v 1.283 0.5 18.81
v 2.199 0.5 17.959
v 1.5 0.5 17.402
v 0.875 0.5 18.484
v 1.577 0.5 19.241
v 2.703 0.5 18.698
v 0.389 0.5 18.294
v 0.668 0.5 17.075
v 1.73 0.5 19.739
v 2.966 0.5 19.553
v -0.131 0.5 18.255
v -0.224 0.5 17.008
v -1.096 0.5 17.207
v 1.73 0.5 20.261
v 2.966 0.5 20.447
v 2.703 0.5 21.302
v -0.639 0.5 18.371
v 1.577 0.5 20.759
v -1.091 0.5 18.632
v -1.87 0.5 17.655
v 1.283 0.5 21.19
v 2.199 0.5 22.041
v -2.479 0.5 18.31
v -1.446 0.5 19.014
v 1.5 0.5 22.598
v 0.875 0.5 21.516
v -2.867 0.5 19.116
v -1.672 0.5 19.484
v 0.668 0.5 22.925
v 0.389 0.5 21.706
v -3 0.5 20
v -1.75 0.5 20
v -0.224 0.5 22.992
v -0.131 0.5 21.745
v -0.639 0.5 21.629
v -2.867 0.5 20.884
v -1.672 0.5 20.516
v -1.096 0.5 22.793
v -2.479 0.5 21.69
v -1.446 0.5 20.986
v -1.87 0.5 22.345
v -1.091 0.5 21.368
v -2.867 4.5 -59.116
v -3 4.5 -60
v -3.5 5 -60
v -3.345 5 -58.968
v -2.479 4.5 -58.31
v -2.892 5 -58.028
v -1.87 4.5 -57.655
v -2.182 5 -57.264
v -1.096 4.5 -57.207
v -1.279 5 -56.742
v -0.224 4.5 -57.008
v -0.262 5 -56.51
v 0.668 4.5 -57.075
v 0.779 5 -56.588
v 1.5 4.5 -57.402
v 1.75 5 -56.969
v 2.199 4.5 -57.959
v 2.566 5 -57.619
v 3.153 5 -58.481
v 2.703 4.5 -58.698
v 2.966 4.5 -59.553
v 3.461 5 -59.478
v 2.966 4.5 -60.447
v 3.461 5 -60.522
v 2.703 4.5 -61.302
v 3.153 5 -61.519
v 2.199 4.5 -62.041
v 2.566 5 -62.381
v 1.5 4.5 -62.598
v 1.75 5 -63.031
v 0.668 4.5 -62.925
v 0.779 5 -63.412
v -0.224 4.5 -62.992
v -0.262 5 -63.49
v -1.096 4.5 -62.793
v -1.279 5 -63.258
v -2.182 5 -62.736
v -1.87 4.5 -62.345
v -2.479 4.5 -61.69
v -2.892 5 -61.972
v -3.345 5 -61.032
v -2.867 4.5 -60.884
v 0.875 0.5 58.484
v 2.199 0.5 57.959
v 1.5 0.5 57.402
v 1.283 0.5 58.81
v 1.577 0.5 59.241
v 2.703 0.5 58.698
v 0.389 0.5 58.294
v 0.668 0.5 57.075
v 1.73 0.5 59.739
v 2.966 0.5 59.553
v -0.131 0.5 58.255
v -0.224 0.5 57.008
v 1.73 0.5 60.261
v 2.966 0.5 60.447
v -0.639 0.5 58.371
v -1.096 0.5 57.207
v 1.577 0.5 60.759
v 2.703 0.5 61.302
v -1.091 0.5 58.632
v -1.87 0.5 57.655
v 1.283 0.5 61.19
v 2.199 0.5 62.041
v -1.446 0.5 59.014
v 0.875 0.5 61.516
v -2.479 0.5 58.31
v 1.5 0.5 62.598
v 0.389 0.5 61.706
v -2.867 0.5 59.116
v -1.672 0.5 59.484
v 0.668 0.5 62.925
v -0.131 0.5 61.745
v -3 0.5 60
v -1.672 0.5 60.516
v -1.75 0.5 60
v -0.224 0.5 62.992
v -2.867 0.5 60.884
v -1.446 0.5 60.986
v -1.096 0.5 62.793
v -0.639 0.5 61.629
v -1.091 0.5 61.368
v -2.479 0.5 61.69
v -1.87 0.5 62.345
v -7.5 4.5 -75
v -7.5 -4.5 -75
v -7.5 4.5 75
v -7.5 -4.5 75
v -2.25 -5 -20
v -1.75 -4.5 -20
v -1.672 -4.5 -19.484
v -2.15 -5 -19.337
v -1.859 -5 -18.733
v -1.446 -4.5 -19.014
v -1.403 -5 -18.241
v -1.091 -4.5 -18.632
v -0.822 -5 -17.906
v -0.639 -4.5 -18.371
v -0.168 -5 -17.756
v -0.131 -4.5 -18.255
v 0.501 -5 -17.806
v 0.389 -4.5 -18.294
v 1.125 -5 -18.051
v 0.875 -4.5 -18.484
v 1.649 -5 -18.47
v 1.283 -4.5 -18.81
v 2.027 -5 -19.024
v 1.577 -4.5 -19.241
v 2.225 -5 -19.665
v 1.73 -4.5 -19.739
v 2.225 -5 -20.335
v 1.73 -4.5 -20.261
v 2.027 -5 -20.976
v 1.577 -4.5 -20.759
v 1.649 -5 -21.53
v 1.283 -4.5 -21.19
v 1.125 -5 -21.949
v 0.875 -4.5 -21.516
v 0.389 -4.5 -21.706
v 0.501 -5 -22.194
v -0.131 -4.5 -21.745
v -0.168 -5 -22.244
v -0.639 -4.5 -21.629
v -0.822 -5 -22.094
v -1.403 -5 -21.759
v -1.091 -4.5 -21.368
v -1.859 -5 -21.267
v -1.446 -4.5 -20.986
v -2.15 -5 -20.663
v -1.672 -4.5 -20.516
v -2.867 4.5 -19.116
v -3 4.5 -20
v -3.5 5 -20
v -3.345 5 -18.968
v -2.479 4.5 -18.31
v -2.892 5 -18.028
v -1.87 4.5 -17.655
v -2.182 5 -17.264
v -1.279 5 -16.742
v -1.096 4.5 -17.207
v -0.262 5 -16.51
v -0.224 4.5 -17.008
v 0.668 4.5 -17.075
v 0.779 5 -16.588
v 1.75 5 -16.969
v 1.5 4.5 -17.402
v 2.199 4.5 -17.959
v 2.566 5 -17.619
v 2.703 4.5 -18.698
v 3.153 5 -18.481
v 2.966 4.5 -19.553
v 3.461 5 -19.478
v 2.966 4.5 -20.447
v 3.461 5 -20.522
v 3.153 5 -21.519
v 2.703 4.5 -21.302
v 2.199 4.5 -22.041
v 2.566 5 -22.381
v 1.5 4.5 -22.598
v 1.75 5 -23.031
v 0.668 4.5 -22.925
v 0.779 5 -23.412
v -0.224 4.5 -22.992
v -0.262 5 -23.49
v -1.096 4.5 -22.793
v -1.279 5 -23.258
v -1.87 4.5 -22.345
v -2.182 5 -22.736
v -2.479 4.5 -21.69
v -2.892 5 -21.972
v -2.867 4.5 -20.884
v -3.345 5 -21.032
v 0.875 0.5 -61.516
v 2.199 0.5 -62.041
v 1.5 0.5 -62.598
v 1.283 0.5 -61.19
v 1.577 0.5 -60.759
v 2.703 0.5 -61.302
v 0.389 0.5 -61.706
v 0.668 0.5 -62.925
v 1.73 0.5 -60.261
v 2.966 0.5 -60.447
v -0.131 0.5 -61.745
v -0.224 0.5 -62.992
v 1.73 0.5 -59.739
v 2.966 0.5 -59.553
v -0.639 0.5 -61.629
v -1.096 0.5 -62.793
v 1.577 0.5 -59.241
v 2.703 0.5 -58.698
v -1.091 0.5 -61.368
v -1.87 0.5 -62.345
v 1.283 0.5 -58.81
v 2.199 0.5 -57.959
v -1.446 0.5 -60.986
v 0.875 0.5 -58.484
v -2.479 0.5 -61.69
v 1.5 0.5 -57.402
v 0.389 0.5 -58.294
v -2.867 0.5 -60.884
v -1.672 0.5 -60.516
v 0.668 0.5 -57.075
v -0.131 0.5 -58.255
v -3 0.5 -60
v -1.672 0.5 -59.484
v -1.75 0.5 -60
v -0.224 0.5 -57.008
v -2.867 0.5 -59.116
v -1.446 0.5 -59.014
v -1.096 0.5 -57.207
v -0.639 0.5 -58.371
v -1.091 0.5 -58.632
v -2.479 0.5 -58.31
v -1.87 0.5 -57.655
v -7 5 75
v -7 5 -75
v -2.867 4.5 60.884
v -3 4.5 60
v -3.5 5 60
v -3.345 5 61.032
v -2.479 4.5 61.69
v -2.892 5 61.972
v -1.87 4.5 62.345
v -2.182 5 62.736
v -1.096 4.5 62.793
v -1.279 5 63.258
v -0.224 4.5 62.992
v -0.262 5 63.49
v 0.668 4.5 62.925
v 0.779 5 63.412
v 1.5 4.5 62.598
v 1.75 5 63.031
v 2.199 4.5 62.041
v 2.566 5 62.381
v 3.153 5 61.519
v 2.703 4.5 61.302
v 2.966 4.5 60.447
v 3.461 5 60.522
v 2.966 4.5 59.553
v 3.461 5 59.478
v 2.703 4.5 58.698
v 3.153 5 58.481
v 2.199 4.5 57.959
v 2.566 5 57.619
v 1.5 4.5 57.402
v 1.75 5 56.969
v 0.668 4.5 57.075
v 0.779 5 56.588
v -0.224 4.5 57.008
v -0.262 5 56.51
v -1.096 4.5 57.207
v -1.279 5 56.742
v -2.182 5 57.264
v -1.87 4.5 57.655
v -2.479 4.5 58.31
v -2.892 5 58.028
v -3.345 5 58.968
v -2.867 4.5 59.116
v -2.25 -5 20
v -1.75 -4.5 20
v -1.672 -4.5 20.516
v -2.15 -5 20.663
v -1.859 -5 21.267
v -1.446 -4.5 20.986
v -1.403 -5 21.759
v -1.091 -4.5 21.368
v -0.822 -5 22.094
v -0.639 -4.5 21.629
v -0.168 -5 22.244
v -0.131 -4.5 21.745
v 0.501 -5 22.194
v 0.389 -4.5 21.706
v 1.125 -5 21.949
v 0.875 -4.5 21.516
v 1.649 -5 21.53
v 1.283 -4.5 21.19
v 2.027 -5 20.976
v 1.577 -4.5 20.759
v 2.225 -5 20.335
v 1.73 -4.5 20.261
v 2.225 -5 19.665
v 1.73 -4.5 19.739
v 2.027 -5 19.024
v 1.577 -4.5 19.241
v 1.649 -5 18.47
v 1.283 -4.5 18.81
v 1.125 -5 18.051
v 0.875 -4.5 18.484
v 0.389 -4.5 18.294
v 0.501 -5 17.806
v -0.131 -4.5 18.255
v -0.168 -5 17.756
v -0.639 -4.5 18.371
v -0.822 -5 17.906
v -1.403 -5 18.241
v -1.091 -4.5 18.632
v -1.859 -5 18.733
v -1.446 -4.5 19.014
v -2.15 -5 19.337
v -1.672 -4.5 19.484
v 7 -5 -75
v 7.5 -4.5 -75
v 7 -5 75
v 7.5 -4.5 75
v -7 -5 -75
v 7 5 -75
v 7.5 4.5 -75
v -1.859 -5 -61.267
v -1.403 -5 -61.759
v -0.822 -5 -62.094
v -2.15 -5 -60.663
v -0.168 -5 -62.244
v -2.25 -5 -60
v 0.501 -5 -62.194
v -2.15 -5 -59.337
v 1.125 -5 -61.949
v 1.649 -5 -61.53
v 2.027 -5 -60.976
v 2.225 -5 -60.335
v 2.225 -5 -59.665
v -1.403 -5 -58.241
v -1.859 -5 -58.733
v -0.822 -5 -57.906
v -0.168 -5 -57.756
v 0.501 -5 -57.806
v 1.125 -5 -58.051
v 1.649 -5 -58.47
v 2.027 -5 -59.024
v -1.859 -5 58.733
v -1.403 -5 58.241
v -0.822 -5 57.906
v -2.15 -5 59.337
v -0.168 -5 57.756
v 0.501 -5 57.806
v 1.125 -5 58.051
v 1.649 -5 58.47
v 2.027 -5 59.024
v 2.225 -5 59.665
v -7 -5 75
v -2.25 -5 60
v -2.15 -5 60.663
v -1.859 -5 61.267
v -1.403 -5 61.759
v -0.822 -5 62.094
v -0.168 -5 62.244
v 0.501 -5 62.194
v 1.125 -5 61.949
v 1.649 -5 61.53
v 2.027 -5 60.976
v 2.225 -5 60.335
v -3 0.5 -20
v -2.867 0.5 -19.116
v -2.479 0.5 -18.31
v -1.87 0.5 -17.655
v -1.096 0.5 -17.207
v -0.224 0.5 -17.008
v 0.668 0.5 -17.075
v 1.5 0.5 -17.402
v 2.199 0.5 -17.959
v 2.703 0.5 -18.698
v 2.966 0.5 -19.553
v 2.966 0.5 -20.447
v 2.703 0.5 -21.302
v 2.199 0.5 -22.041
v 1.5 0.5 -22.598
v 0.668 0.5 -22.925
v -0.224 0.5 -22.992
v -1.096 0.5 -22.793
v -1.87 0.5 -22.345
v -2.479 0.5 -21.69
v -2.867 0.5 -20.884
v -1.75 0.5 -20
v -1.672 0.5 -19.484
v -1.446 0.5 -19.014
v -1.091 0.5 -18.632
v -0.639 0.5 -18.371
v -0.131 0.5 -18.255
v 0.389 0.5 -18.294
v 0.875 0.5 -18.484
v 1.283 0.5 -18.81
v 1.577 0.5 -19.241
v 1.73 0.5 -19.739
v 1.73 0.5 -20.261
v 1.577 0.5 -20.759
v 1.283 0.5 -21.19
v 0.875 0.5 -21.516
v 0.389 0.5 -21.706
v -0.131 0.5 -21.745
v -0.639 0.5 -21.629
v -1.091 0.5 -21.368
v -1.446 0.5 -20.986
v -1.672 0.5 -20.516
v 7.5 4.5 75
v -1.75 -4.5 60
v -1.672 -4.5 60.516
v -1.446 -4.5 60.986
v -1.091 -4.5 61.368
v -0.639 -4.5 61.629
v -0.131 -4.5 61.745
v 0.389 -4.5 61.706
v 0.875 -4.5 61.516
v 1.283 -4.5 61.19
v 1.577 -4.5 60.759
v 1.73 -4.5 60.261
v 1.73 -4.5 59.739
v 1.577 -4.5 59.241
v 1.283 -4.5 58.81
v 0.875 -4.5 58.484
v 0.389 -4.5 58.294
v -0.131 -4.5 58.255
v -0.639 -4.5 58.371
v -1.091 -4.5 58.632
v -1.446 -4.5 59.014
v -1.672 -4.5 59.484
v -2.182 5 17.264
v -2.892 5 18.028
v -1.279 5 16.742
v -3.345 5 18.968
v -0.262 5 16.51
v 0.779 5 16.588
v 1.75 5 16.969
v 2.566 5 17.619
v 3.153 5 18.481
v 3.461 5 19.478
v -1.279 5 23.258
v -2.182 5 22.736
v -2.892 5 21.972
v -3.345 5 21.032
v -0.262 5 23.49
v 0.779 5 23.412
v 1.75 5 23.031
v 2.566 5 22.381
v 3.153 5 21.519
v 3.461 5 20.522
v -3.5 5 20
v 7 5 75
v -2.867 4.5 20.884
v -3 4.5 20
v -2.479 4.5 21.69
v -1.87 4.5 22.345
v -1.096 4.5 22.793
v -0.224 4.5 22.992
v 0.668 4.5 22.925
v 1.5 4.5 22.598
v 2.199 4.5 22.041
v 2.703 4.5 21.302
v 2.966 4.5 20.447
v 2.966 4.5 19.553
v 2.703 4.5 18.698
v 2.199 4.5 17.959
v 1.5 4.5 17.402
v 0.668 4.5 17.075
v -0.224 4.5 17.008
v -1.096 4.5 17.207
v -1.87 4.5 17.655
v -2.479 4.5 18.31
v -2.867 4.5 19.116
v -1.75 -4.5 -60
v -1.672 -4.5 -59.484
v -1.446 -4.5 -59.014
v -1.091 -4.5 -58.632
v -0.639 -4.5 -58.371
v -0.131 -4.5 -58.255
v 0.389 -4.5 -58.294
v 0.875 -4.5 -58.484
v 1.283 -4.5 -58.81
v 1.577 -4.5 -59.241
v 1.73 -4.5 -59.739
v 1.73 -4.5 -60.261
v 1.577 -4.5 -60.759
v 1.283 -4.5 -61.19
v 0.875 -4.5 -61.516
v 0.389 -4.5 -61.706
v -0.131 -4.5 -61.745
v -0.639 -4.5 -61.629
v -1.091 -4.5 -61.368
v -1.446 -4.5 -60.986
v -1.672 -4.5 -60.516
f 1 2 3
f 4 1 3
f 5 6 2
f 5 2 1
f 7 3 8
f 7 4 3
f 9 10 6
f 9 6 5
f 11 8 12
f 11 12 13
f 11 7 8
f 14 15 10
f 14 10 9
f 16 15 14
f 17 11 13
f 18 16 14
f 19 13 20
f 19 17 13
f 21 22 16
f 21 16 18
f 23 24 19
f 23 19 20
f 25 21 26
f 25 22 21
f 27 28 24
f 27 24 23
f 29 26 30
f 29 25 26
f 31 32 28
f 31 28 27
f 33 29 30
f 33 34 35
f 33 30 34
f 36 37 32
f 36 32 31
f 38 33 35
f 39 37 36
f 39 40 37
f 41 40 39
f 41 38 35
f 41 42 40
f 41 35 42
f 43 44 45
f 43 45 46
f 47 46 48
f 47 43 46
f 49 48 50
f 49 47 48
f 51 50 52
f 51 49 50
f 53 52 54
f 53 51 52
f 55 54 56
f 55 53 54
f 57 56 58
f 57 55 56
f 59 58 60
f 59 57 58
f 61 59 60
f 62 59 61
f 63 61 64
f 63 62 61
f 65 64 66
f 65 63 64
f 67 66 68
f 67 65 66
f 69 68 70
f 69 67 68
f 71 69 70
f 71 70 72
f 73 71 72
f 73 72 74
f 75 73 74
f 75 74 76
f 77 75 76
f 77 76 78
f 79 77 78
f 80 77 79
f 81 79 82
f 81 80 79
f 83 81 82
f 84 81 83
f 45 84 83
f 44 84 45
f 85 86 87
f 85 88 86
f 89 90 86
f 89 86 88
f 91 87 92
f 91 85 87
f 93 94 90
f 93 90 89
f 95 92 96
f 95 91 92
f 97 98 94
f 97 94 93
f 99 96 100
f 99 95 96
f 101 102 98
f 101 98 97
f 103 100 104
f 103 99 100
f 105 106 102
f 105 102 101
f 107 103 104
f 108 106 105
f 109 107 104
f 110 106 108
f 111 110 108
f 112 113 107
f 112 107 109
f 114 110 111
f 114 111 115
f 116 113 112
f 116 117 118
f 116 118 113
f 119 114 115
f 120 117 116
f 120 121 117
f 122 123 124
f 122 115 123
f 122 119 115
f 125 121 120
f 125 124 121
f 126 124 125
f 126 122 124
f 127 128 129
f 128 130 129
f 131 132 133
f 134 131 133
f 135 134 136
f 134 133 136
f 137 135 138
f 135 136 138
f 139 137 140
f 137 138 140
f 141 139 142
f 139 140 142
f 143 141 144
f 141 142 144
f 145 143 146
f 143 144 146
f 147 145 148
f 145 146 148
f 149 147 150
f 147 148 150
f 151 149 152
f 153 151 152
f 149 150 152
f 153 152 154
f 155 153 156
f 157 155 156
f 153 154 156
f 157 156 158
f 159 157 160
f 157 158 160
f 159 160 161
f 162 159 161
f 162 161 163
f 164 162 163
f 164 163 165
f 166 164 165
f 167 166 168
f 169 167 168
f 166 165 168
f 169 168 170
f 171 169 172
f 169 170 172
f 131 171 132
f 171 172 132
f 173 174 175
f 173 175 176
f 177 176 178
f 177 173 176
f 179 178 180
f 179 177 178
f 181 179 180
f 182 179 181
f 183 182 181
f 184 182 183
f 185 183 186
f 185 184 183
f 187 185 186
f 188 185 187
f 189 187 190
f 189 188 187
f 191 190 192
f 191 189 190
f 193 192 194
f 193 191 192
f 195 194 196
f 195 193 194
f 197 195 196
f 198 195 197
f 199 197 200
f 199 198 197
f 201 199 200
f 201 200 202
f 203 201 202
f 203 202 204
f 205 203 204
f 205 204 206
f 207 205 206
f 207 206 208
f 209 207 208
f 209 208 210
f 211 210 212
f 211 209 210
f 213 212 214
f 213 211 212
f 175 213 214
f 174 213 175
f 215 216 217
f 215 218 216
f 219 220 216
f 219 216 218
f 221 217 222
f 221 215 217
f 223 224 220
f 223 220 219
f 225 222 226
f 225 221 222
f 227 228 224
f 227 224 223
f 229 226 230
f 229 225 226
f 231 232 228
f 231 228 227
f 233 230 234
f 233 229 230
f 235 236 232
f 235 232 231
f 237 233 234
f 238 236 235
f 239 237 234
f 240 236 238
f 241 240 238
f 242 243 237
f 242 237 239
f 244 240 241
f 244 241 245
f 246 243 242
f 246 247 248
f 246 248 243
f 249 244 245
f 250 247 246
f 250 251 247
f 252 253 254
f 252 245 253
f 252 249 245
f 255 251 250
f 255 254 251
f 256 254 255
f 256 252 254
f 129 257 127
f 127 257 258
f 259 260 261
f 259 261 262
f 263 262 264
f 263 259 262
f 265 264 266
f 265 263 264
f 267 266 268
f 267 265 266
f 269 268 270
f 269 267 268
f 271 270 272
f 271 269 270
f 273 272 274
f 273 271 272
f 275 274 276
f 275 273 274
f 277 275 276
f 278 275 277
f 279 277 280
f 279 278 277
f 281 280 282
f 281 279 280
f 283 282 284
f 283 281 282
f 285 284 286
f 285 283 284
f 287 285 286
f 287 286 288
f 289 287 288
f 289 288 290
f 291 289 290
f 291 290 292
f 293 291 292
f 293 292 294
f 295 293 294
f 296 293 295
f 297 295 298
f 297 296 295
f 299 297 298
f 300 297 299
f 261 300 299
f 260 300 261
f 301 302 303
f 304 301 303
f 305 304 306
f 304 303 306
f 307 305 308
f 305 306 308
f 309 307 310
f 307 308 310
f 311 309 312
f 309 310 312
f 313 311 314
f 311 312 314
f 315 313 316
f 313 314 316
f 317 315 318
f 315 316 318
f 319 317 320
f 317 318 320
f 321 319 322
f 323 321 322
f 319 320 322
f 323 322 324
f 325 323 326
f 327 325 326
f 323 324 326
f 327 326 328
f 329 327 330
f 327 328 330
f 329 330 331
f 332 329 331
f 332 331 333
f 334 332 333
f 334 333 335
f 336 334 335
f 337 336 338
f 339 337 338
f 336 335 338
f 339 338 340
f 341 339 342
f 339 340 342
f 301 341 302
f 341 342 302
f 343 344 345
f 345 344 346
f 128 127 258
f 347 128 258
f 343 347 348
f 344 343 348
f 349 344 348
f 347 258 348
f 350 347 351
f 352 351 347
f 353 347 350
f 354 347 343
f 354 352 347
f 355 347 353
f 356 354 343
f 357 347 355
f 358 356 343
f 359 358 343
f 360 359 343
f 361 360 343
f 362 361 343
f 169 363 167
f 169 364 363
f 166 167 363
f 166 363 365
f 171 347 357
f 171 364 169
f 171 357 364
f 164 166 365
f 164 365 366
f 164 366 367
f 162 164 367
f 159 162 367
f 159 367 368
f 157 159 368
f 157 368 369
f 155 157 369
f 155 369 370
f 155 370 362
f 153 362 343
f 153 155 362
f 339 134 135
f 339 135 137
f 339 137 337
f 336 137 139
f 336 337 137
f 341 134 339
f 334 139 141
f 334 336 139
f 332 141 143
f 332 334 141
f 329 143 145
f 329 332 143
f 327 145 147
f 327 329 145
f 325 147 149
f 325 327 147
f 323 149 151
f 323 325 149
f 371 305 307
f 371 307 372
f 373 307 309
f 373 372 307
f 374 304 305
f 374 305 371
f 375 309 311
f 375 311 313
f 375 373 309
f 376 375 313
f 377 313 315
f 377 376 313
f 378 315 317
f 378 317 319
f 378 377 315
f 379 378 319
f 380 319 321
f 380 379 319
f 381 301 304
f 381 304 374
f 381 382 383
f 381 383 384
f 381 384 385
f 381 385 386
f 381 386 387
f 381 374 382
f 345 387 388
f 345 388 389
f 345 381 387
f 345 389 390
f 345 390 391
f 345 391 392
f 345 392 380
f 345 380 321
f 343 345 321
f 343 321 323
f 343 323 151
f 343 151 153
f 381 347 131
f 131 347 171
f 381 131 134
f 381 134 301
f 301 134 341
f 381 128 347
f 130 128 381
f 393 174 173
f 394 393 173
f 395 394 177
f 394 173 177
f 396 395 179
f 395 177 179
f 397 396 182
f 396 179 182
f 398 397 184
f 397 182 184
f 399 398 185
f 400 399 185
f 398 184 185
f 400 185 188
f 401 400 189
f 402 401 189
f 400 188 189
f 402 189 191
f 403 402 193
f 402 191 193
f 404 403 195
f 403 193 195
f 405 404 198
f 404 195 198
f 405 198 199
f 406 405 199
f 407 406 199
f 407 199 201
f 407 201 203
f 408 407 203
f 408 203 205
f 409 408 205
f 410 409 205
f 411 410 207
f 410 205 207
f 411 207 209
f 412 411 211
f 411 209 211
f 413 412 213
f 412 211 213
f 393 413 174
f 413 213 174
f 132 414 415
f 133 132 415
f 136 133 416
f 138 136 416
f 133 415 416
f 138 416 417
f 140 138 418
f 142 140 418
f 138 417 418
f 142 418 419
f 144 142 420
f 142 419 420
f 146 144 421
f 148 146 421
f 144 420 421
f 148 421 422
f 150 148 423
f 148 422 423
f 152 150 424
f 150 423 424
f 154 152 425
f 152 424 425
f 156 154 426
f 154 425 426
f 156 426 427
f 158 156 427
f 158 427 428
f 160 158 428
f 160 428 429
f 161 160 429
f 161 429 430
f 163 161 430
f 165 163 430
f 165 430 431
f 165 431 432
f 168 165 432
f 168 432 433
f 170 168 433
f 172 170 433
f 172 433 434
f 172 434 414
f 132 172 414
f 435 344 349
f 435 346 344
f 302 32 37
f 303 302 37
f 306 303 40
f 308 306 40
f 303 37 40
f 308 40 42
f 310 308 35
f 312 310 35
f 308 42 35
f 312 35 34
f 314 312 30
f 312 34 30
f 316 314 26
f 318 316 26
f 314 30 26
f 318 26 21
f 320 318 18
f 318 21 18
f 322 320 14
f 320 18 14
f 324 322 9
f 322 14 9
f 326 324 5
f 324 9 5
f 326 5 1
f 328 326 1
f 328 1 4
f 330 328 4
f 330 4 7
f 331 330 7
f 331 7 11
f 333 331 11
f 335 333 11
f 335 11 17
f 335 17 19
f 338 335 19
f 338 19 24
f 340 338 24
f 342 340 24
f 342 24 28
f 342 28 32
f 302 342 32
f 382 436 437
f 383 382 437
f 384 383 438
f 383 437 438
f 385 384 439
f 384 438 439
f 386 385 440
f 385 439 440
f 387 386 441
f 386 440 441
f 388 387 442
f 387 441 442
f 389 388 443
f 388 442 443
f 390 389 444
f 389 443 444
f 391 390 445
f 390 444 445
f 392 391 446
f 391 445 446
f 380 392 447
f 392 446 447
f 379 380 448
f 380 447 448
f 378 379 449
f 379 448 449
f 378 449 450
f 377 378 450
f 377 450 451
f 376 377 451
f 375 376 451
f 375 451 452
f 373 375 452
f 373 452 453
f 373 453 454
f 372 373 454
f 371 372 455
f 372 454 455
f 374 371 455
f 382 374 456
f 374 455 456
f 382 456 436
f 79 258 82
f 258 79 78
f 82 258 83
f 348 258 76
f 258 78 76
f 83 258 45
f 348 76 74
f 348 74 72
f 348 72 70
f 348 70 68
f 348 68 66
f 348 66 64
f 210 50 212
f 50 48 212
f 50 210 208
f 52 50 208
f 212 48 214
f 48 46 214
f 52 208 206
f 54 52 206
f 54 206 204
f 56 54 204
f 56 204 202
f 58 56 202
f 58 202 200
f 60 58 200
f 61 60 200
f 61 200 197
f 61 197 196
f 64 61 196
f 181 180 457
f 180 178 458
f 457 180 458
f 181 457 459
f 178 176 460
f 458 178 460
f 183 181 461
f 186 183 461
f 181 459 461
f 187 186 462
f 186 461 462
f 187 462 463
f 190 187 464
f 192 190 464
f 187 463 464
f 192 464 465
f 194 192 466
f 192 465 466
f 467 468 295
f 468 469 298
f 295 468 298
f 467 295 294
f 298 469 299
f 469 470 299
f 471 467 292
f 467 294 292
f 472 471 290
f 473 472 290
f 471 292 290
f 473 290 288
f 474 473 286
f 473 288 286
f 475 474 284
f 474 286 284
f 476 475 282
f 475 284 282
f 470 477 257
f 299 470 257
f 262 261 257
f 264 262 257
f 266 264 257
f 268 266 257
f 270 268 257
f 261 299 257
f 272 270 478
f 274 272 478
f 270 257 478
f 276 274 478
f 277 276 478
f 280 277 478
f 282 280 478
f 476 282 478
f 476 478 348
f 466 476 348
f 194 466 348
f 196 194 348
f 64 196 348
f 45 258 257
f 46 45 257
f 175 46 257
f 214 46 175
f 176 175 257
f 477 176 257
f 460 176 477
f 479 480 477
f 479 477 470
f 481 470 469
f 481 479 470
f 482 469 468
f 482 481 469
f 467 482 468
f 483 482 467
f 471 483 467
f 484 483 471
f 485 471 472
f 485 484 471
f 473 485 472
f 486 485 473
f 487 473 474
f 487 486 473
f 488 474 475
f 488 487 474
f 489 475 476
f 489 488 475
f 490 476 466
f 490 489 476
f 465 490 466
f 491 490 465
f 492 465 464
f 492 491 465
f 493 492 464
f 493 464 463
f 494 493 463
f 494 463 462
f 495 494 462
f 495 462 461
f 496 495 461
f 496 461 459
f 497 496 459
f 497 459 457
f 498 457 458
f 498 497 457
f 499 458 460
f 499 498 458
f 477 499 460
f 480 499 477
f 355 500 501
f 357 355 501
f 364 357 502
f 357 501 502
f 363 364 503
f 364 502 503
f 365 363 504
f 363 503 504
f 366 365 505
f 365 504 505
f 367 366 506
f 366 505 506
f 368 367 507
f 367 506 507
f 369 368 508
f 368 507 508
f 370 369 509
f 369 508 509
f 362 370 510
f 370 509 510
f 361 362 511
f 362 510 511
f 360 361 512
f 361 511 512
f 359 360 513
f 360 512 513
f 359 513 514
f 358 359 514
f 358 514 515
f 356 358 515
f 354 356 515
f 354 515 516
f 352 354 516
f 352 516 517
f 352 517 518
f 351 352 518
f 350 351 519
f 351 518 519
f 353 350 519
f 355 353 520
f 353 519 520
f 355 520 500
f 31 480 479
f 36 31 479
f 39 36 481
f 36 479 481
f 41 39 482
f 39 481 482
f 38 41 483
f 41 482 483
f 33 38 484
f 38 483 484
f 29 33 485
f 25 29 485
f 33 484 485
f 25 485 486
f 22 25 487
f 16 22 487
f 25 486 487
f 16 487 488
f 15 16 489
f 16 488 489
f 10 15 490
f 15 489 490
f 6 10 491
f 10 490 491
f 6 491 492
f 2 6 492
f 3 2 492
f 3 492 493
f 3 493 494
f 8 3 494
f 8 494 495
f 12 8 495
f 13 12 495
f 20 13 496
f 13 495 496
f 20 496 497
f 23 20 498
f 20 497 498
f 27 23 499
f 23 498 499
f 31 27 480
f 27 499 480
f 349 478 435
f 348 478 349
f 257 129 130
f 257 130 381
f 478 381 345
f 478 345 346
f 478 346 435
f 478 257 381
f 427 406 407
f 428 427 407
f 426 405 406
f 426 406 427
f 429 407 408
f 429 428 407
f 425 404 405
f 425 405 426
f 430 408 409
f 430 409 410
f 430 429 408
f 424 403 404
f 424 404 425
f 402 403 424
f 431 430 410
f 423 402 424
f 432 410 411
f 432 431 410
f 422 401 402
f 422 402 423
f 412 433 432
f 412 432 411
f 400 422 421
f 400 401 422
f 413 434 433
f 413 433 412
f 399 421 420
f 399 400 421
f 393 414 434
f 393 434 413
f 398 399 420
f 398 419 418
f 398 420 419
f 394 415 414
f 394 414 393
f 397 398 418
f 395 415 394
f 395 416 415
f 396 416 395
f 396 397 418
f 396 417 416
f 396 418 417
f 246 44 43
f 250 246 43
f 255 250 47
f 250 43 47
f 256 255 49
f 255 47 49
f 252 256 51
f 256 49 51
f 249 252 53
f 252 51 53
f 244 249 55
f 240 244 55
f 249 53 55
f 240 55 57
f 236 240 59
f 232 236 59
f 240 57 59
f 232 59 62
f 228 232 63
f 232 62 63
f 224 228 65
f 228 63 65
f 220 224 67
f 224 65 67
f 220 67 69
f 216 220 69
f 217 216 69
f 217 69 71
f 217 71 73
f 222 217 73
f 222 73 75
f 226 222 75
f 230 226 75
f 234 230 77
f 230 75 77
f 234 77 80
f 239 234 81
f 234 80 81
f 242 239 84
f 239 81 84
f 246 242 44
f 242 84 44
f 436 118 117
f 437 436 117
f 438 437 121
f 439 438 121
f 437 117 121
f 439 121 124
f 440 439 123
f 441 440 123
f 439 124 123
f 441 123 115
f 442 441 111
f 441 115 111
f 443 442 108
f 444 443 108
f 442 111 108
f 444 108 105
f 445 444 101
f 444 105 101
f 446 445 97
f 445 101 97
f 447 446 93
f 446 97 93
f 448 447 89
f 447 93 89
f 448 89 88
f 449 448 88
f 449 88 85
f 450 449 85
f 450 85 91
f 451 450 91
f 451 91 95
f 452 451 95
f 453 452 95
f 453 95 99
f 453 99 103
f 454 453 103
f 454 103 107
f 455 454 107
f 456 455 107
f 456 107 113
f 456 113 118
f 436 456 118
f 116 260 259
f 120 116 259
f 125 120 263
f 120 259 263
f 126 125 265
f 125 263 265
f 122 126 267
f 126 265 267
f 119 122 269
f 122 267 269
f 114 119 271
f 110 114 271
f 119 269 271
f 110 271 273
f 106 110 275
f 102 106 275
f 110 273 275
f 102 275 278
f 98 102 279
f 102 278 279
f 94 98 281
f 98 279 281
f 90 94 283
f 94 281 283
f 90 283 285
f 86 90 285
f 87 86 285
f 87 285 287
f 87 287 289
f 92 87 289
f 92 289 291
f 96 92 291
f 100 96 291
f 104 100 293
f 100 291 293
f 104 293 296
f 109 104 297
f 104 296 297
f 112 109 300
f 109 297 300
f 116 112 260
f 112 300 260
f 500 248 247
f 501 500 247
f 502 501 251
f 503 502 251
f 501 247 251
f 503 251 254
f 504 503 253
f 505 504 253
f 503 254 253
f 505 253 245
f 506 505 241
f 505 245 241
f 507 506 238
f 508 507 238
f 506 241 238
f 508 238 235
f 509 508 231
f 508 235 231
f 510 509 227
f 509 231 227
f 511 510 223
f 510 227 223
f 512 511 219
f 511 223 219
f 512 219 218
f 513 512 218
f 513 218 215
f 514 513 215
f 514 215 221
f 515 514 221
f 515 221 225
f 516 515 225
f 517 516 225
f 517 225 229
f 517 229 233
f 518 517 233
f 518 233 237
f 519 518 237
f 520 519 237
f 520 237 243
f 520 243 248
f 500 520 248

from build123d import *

# Parameters (mm, degrees)
SKETCH1_W                  = 15
SKETCH1_H                  = 10
BOSS_EXTRUDE1_DEPTH        = 75
SKETCH2_R                  = 3
CUT_EXTRUDE1_DEPTH         = 4.5
SKETCH3_R                  = 1.75
CUT_EXTRUDE2_DEPTH         = 76.574466588
CHAMFER1_SIZE              = 0.5
LPATTERN1_COUNT            = 4
LPATTERN1_PITCH            = 40
CHAMFER1_OF_LPATTERN1_SIZE = 0.5
CHAMFER2_SIZE              = 0.5


with BuildPart() as part:
    # Sketch1 → Boss-Extrude1 (new, symmetric)
    with BuildSketch(Plane.XY):
        Rectangle(SKETCH1_W, SKETCH1_H)
    extrude(amount=BOSS_EXTRUDE1_DEPTH, both=True)

    # Sketch2 → Cut-Extrude1 (cut)
    with BuildSketch(Plane(origin=(0, 5, 0), x_dir=(1, 0, 0), z_dir=(0, 1, 0))):
        with Locations(Location((0, -60, 0), (0, 0, 180))):
            Circle(SKETCH2_R)
    cut_extrude1 = extrude(amount=-CUT_EXTRUDE1_DEPTH, mode=Mode.SUBTRACT)

    # Sketch3 → Cut-Extrude2 (cut, through all)
    with BuildSketch(Plane(origin=(0, 0.5, 0), x_dir=(1, 0, 0), z_dir=(0, 1, 0))):
        with Locations(Location((0, -60, 0), (0, 0, 180))):
            Circle(SKETCH3_R)
    cut_extrude2 = extrude(amount=-CUT_EXTRUDE2_DEPTH, mode=Mode.SUBTRACT)

    # Chamfer1
    chamfer1_edges = [part.edges().sort_by_distance(p)[0] for p in [
        (3, 5, 60),
        (1.75, -5, 60),
    ]]
    chamfer(chamfer1_edges, length=CHAMFER1_SIZE)

    # LPattern1: Cut-Extrude1, Cut-Extrude2 ×4
    with Locations(*[(0, 0, -i * LPATTERN1_PITCH) for i in range(1, LPATTERN1_COUNT)]):
        add(cut_extrude1, mode=Mode.SUBTRACT)
        add(cut_extrude2, mode=Mode.SUBTRACT)

    # Chamfer1 of LPattern1
    chamfer1_of_lpattern1_edges = [part.edges().sort_by_distance(p)[0] for p in [
        (3, 5, 20),
        (1.75, -5, 20),
        (3, 5, -20),
        (1.75, -5, -20),
        (3, 5, -60),
        (1.75, -5, -60),
    ]]
    chamfer(chamfer1_of_lpattern1_edges, length=CHAMFER1_OF_LPATTERN1_SIZE)

    # Chamfer2
    chamfer2_edges = [part.edges().sort_by_distance(p)[0] for p in [
        (-7.5, 5, 0),
        (7.5, 5, 0),
        (7.5, -5, 0),
        (-7.5, -5, 0),
    ]]
    chamfer(chamfer2_edges, length=CHAMFER2_SIZE)


solid = part.part
